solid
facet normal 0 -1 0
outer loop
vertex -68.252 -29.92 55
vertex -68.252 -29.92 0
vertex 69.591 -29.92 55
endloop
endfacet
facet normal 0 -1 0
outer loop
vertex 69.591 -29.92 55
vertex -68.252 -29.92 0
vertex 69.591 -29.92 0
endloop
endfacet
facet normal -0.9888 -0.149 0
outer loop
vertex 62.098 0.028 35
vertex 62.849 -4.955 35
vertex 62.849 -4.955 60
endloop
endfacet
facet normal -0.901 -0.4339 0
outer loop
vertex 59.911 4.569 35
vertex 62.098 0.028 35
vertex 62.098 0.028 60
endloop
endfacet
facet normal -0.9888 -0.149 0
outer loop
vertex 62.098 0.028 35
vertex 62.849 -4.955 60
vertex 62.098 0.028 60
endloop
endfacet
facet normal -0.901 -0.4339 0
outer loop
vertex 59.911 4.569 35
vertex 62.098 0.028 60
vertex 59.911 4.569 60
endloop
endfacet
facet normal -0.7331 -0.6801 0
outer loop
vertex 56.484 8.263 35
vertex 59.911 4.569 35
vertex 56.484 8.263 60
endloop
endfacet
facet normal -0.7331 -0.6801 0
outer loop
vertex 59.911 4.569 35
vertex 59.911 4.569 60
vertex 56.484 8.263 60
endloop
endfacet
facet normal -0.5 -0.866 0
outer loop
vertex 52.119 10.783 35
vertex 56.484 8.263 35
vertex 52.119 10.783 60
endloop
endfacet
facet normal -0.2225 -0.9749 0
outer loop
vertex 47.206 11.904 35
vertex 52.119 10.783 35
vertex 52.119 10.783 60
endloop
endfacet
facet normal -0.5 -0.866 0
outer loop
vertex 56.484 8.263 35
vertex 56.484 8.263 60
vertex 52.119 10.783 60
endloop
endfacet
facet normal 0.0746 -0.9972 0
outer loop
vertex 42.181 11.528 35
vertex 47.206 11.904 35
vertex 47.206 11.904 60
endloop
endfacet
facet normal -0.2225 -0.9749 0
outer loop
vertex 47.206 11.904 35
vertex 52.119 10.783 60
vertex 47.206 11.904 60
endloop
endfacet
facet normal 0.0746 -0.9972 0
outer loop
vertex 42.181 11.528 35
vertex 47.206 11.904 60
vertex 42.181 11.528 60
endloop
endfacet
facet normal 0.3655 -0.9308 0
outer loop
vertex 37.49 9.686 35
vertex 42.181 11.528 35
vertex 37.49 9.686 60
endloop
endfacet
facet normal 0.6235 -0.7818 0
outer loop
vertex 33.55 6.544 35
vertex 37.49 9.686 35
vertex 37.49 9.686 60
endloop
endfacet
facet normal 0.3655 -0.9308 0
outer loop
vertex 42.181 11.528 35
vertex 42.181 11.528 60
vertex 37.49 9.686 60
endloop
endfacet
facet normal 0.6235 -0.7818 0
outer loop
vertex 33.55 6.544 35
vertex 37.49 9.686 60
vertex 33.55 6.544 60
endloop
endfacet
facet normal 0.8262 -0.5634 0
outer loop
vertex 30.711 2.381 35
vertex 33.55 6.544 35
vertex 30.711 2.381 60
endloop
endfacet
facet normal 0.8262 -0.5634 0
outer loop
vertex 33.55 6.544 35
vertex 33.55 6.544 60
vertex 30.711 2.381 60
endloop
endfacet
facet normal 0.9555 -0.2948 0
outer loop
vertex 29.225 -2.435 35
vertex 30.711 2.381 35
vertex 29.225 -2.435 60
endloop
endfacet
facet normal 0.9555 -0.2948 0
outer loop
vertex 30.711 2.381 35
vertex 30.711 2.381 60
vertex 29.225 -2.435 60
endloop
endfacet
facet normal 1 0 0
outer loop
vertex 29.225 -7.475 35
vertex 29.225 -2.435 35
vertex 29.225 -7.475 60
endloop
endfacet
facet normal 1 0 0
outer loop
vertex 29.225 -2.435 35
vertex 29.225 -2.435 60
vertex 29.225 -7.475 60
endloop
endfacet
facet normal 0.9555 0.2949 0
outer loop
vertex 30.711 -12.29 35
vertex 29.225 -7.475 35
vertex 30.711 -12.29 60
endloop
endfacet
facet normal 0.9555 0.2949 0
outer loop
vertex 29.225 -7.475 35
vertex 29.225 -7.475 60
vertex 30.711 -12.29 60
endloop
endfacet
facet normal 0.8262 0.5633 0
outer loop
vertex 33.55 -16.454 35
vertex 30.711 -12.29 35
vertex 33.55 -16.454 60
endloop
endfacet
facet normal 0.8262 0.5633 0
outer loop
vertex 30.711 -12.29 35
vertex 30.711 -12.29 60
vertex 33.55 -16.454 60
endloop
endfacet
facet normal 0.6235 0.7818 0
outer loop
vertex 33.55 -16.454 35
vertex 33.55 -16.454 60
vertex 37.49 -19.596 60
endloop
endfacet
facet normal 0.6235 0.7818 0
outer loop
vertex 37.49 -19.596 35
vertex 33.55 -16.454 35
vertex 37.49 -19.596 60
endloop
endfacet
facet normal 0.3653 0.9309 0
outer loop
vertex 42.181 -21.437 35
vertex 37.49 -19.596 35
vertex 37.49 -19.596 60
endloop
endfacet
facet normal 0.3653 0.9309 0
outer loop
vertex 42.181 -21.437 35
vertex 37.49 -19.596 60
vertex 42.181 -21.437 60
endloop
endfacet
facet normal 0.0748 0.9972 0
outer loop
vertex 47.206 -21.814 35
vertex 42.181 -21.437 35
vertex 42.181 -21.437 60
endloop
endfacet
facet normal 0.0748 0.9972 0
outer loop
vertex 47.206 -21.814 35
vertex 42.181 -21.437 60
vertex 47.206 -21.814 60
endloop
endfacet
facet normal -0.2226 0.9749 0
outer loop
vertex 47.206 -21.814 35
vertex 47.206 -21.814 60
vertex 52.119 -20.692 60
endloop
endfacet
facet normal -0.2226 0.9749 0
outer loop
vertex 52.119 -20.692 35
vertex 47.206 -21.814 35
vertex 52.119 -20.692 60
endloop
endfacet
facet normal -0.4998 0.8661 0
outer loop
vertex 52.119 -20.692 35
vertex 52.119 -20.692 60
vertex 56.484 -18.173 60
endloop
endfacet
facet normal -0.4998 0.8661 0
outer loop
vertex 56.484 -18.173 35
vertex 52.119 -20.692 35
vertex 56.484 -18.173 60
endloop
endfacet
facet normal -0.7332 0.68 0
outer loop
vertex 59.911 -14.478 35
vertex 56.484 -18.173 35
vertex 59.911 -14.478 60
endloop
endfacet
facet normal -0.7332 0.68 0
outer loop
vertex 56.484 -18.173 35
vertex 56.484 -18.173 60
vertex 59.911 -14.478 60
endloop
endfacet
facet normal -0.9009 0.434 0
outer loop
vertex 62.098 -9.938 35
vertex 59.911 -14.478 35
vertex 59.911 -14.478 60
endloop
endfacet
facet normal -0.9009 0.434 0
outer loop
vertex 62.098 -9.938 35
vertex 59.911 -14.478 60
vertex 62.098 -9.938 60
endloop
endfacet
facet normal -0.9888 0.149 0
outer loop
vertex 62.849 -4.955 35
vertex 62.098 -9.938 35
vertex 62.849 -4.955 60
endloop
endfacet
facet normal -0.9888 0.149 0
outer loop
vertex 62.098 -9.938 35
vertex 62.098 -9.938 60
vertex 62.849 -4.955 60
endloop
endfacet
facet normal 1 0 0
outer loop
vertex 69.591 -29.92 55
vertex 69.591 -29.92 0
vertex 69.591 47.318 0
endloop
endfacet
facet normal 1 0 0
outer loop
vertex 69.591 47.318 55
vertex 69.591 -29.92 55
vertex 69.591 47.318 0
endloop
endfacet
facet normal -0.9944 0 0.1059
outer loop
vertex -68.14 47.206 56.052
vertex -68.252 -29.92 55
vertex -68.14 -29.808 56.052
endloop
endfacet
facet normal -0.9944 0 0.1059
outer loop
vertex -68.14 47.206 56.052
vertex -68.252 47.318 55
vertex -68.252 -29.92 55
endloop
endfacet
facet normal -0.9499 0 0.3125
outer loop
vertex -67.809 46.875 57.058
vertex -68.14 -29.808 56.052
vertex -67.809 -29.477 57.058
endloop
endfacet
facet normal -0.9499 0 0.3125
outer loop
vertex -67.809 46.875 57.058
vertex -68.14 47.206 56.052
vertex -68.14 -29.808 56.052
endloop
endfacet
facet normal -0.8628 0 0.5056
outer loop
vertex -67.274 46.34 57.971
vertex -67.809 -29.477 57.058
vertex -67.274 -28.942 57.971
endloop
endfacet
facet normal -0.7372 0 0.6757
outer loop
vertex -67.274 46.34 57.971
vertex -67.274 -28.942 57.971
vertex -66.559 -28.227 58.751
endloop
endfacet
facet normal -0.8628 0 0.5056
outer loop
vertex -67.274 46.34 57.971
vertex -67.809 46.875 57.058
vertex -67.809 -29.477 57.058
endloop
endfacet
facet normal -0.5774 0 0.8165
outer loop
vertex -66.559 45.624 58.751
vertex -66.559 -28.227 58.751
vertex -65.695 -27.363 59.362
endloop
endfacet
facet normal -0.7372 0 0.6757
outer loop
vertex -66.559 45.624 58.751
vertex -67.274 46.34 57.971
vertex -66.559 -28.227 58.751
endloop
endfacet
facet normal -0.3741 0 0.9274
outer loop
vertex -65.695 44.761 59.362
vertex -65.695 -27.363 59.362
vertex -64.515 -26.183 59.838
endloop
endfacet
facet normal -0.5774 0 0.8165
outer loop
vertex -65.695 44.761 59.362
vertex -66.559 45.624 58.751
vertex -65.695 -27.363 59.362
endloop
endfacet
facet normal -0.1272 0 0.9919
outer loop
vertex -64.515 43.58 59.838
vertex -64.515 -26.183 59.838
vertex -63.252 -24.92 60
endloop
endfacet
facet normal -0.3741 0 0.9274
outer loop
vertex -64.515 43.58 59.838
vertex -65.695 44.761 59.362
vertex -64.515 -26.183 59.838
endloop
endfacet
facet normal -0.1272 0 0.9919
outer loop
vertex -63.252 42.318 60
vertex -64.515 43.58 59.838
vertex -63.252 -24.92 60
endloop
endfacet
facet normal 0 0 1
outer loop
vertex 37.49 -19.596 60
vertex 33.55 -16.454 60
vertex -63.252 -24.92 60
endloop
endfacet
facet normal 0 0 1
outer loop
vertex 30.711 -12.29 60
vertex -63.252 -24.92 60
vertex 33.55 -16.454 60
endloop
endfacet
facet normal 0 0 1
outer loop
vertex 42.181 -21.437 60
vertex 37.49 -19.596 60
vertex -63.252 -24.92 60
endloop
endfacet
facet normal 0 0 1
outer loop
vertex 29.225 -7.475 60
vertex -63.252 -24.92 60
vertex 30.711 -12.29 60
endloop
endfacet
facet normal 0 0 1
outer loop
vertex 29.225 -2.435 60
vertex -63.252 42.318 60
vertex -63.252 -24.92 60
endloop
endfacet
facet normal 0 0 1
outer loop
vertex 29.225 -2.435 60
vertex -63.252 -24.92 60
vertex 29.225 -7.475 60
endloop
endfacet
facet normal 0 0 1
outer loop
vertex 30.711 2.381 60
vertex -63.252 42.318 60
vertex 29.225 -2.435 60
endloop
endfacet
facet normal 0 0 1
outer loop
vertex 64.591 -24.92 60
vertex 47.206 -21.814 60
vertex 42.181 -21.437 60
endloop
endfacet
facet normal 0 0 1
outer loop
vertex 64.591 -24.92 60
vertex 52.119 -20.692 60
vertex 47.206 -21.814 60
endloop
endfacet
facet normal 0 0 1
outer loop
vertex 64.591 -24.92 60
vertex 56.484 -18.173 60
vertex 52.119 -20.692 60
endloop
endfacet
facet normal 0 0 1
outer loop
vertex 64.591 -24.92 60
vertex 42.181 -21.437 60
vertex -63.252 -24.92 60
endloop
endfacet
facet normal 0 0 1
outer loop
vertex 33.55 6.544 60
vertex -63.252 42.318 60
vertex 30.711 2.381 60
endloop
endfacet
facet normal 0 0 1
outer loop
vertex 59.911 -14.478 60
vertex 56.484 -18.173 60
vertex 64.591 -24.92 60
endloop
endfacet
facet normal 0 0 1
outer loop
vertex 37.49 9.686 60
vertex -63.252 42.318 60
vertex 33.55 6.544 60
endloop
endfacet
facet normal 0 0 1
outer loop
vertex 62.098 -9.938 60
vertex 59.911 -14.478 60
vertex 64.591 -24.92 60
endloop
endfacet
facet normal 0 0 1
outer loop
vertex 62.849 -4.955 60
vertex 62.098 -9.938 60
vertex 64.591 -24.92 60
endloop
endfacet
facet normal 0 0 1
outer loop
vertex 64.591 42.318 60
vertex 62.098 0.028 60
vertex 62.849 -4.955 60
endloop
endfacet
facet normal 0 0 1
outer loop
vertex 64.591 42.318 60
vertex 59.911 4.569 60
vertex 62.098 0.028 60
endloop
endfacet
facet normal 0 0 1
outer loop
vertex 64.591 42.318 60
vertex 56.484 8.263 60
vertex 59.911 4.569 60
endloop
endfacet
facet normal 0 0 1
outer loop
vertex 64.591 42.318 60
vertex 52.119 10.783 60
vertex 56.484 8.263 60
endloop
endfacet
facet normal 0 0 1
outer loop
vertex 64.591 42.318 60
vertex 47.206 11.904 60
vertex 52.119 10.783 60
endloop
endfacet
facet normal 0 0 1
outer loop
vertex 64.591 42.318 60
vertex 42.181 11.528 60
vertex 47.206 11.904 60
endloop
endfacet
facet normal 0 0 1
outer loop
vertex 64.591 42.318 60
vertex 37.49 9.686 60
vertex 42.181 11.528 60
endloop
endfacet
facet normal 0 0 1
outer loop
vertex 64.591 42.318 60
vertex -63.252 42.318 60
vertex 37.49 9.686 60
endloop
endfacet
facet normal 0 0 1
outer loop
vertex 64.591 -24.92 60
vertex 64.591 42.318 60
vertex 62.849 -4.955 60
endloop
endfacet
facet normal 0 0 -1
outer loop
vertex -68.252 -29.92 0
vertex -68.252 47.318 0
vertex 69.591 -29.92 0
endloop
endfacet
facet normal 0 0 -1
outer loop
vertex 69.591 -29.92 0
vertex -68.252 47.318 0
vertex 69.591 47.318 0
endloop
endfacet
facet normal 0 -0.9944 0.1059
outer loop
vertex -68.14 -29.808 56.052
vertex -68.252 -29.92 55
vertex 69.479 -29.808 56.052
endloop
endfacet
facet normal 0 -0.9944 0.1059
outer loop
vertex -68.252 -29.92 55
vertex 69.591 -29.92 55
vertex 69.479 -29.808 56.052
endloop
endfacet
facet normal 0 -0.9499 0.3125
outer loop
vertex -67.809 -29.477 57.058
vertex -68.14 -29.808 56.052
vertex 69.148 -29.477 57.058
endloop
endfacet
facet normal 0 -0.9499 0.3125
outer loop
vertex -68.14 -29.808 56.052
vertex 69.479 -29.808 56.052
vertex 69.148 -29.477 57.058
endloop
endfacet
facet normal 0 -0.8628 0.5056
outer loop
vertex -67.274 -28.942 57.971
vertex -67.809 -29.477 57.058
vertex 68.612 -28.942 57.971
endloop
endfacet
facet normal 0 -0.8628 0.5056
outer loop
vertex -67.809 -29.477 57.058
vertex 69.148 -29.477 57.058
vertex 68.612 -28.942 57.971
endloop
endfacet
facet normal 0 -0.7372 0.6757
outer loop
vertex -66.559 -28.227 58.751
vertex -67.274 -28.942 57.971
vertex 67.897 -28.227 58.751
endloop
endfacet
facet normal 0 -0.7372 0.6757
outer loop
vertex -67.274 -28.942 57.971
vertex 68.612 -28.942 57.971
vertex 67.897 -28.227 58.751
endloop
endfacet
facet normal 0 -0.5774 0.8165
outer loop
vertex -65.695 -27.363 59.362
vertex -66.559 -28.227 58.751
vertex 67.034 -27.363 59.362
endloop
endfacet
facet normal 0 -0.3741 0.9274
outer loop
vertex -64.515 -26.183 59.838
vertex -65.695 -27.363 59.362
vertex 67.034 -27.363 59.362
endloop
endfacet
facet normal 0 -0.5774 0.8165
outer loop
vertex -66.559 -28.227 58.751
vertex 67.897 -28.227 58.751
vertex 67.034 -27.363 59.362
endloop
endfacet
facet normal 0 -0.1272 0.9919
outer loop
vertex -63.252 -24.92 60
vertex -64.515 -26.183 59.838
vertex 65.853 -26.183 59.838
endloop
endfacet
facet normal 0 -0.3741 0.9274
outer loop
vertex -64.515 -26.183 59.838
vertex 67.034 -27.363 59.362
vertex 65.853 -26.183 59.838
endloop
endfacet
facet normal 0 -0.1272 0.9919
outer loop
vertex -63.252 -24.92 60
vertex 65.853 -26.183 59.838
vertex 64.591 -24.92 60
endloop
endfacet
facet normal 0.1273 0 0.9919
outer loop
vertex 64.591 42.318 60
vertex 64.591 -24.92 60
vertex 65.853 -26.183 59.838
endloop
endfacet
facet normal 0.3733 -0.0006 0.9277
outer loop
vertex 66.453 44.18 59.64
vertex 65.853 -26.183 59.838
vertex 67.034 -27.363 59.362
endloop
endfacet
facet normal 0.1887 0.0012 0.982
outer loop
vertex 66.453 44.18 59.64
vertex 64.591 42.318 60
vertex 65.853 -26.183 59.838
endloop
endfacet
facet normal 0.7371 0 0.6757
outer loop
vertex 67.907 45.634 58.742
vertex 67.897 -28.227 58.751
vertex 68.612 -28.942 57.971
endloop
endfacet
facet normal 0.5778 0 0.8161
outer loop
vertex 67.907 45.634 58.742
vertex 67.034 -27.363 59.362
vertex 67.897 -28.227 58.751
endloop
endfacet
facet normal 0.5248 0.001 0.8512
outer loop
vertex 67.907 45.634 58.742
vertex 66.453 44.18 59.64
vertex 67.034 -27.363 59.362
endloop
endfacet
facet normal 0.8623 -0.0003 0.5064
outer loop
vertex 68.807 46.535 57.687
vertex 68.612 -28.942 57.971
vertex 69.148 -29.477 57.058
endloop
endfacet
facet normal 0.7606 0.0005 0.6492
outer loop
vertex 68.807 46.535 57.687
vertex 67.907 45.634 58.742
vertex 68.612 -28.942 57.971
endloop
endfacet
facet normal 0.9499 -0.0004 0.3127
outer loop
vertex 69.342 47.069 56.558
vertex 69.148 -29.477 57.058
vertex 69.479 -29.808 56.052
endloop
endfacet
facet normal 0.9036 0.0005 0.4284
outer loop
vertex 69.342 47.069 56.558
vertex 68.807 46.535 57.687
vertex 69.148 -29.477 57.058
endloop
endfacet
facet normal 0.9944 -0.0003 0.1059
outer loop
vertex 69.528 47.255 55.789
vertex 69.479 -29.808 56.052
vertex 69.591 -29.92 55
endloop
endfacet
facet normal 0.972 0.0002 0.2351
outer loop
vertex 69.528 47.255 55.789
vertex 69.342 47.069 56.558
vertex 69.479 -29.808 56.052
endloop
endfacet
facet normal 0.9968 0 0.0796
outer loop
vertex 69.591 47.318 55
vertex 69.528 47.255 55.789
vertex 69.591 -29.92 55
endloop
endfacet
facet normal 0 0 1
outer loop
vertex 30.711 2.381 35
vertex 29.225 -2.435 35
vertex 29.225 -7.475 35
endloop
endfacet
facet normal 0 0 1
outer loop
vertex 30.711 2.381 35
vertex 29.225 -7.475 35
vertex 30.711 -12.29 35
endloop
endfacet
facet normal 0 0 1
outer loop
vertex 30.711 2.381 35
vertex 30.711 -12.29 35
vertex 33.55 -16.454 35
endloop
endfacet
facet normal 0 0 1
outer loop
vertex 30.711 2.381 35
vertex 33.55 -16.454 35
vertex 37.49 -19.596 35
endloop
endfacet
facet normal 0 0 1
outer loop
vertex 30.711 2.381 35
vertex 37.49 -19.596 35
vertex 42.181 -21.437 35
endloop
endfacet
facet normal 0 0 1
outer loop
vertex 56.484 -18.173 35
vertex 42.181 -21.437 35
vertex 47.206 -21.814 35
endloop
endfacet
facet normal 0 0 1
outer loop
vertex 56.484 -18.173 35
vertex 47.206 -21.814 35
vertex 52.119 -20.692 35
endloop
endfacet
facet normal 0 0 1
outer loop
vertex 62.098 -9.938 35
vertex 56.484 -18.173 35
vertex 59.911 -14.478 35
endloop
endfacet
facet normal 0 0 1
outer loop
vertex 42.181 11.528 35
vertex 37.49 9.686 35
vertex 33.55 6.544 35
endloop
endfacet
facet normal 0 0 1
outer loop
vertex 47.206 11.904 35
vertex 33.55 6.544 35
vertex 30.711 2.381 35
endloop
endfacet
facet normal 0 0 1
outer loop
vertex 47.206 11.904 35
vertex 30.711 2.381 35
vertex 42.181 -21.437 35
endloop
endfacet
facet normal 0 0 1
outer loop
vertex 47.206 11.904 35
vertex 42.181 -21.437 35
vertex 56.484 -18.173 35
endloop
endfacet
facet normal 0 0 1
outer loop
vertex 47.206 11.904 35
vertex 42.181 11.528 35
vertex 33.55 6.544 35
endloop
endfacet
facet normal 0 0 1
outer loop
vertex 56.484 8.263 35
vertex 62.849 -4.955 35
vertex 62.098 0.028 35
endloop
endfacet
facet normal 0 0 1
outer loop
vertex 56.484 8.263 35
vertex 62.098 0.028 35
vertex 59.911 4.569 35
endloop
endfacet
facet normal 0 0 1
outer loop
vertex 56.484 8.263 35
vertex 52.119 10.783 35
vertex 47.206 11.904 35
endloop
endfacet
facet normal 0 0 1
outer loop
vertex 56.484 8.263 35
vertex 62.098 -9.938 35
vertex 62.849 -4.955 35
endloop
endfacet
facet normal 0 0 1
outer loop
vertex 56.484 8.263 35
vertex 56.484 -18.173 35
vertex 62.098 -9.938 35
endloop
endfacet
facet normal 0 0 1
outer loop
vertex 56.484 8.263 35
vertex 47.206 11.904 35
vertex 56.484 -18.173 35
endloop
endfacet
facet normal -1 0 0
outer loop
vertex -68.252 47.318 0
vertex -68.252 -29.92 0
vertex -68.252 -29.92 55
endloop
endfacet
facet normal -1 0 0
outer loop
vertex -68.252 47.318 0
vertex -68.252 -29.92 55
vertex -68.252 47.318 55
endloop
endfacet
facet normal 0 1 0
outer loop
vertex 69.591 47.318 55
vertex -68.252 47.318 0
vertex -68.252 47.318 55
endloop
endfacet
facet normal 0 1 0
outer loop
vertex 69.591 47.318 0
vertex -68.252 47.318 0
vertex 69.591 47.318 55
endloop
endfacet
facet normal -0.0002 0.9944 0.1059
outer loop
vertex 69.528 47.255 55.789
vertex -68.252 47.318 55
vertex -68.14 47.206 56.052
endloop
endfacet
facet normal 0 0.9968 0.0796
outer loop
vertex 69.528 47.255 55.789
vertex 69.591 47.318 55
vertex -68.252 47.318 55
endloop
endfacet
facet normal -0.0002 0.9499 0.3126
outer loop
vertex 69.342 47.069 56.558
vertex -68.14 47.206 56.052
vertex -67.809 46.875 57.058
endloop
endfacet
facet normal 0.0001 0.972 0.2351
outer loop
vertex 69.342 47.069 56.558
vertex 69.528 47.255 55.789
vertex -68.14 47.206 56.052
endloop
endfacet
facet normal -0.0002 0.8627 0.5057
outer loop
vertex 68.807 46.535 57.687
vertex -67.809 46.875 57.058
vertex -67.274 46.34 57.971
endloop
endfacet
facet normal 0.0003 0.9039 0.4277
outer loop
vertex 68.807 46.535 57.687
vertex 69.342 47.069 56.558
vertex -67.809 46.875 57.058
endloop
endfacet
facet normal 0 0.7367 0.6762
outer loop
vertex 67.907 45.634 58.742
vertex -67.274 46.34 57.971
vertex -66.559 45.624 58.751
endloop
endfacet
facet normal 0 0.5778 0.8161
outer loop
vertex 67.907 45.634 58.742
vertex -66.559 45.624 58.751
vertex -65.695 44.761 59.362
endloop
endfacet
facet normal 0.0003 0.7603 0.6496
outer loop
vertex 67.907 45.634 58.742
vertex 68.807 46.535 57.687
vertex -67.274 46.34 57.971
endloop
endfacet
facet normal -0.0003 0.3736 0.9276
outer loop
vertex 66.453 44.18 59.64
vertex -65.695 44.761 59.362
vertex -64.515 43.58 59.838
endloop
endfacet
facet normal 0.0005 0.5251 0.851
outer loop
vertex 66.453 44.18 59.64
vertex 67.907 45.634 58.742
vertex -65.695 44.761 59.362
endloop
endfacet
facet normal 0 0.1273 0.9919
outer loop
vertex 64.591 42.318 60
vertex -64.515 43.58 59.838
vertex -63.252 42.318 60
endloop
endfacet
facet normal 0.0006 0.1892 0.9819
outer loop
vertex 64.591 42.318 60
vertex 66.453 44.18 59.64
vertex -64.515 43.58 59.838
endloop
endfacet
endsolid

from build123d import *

# Parameters (mm, degrees)
F0_W     = 137.842797
F0_H     = 77.237847
F1_DEPTH = 60
F2_R     = 16.906171
F3_DEPTH = 25
F4_R     = 5


with BuildPart() as f1:
    # F0 (on Top) → F1 (new body)
    with BuildSketch(Plane.XY):
        with Locations((0.66914, 8.698817)):
            Rectangle(F0_W, F0_H)
    extrude(amount=F1_DEPTH)

    # F2 (on face) → F3 (cut)
    with BuildSketch(Plane.XY.offset(60)):
        with Locations((45.942705, -4.954772)):
            Circle(F2_R)
    extrude(amount=-F3_DEPTH, mode=Mode.SUBTRACT)

    # F4
    f4_edges = [f1.edges().sort_by_distance(p)[0] for p in [
        (0.66914, -29.920107, 60),
        (69.590539, 8.698816, 60),
        (0.66914, 47.31774, 60),
        (-68.252258, 8.698816, 60),
    ]]
    fillet(f4_edges, radius=F4_R)


solid = f1.part
